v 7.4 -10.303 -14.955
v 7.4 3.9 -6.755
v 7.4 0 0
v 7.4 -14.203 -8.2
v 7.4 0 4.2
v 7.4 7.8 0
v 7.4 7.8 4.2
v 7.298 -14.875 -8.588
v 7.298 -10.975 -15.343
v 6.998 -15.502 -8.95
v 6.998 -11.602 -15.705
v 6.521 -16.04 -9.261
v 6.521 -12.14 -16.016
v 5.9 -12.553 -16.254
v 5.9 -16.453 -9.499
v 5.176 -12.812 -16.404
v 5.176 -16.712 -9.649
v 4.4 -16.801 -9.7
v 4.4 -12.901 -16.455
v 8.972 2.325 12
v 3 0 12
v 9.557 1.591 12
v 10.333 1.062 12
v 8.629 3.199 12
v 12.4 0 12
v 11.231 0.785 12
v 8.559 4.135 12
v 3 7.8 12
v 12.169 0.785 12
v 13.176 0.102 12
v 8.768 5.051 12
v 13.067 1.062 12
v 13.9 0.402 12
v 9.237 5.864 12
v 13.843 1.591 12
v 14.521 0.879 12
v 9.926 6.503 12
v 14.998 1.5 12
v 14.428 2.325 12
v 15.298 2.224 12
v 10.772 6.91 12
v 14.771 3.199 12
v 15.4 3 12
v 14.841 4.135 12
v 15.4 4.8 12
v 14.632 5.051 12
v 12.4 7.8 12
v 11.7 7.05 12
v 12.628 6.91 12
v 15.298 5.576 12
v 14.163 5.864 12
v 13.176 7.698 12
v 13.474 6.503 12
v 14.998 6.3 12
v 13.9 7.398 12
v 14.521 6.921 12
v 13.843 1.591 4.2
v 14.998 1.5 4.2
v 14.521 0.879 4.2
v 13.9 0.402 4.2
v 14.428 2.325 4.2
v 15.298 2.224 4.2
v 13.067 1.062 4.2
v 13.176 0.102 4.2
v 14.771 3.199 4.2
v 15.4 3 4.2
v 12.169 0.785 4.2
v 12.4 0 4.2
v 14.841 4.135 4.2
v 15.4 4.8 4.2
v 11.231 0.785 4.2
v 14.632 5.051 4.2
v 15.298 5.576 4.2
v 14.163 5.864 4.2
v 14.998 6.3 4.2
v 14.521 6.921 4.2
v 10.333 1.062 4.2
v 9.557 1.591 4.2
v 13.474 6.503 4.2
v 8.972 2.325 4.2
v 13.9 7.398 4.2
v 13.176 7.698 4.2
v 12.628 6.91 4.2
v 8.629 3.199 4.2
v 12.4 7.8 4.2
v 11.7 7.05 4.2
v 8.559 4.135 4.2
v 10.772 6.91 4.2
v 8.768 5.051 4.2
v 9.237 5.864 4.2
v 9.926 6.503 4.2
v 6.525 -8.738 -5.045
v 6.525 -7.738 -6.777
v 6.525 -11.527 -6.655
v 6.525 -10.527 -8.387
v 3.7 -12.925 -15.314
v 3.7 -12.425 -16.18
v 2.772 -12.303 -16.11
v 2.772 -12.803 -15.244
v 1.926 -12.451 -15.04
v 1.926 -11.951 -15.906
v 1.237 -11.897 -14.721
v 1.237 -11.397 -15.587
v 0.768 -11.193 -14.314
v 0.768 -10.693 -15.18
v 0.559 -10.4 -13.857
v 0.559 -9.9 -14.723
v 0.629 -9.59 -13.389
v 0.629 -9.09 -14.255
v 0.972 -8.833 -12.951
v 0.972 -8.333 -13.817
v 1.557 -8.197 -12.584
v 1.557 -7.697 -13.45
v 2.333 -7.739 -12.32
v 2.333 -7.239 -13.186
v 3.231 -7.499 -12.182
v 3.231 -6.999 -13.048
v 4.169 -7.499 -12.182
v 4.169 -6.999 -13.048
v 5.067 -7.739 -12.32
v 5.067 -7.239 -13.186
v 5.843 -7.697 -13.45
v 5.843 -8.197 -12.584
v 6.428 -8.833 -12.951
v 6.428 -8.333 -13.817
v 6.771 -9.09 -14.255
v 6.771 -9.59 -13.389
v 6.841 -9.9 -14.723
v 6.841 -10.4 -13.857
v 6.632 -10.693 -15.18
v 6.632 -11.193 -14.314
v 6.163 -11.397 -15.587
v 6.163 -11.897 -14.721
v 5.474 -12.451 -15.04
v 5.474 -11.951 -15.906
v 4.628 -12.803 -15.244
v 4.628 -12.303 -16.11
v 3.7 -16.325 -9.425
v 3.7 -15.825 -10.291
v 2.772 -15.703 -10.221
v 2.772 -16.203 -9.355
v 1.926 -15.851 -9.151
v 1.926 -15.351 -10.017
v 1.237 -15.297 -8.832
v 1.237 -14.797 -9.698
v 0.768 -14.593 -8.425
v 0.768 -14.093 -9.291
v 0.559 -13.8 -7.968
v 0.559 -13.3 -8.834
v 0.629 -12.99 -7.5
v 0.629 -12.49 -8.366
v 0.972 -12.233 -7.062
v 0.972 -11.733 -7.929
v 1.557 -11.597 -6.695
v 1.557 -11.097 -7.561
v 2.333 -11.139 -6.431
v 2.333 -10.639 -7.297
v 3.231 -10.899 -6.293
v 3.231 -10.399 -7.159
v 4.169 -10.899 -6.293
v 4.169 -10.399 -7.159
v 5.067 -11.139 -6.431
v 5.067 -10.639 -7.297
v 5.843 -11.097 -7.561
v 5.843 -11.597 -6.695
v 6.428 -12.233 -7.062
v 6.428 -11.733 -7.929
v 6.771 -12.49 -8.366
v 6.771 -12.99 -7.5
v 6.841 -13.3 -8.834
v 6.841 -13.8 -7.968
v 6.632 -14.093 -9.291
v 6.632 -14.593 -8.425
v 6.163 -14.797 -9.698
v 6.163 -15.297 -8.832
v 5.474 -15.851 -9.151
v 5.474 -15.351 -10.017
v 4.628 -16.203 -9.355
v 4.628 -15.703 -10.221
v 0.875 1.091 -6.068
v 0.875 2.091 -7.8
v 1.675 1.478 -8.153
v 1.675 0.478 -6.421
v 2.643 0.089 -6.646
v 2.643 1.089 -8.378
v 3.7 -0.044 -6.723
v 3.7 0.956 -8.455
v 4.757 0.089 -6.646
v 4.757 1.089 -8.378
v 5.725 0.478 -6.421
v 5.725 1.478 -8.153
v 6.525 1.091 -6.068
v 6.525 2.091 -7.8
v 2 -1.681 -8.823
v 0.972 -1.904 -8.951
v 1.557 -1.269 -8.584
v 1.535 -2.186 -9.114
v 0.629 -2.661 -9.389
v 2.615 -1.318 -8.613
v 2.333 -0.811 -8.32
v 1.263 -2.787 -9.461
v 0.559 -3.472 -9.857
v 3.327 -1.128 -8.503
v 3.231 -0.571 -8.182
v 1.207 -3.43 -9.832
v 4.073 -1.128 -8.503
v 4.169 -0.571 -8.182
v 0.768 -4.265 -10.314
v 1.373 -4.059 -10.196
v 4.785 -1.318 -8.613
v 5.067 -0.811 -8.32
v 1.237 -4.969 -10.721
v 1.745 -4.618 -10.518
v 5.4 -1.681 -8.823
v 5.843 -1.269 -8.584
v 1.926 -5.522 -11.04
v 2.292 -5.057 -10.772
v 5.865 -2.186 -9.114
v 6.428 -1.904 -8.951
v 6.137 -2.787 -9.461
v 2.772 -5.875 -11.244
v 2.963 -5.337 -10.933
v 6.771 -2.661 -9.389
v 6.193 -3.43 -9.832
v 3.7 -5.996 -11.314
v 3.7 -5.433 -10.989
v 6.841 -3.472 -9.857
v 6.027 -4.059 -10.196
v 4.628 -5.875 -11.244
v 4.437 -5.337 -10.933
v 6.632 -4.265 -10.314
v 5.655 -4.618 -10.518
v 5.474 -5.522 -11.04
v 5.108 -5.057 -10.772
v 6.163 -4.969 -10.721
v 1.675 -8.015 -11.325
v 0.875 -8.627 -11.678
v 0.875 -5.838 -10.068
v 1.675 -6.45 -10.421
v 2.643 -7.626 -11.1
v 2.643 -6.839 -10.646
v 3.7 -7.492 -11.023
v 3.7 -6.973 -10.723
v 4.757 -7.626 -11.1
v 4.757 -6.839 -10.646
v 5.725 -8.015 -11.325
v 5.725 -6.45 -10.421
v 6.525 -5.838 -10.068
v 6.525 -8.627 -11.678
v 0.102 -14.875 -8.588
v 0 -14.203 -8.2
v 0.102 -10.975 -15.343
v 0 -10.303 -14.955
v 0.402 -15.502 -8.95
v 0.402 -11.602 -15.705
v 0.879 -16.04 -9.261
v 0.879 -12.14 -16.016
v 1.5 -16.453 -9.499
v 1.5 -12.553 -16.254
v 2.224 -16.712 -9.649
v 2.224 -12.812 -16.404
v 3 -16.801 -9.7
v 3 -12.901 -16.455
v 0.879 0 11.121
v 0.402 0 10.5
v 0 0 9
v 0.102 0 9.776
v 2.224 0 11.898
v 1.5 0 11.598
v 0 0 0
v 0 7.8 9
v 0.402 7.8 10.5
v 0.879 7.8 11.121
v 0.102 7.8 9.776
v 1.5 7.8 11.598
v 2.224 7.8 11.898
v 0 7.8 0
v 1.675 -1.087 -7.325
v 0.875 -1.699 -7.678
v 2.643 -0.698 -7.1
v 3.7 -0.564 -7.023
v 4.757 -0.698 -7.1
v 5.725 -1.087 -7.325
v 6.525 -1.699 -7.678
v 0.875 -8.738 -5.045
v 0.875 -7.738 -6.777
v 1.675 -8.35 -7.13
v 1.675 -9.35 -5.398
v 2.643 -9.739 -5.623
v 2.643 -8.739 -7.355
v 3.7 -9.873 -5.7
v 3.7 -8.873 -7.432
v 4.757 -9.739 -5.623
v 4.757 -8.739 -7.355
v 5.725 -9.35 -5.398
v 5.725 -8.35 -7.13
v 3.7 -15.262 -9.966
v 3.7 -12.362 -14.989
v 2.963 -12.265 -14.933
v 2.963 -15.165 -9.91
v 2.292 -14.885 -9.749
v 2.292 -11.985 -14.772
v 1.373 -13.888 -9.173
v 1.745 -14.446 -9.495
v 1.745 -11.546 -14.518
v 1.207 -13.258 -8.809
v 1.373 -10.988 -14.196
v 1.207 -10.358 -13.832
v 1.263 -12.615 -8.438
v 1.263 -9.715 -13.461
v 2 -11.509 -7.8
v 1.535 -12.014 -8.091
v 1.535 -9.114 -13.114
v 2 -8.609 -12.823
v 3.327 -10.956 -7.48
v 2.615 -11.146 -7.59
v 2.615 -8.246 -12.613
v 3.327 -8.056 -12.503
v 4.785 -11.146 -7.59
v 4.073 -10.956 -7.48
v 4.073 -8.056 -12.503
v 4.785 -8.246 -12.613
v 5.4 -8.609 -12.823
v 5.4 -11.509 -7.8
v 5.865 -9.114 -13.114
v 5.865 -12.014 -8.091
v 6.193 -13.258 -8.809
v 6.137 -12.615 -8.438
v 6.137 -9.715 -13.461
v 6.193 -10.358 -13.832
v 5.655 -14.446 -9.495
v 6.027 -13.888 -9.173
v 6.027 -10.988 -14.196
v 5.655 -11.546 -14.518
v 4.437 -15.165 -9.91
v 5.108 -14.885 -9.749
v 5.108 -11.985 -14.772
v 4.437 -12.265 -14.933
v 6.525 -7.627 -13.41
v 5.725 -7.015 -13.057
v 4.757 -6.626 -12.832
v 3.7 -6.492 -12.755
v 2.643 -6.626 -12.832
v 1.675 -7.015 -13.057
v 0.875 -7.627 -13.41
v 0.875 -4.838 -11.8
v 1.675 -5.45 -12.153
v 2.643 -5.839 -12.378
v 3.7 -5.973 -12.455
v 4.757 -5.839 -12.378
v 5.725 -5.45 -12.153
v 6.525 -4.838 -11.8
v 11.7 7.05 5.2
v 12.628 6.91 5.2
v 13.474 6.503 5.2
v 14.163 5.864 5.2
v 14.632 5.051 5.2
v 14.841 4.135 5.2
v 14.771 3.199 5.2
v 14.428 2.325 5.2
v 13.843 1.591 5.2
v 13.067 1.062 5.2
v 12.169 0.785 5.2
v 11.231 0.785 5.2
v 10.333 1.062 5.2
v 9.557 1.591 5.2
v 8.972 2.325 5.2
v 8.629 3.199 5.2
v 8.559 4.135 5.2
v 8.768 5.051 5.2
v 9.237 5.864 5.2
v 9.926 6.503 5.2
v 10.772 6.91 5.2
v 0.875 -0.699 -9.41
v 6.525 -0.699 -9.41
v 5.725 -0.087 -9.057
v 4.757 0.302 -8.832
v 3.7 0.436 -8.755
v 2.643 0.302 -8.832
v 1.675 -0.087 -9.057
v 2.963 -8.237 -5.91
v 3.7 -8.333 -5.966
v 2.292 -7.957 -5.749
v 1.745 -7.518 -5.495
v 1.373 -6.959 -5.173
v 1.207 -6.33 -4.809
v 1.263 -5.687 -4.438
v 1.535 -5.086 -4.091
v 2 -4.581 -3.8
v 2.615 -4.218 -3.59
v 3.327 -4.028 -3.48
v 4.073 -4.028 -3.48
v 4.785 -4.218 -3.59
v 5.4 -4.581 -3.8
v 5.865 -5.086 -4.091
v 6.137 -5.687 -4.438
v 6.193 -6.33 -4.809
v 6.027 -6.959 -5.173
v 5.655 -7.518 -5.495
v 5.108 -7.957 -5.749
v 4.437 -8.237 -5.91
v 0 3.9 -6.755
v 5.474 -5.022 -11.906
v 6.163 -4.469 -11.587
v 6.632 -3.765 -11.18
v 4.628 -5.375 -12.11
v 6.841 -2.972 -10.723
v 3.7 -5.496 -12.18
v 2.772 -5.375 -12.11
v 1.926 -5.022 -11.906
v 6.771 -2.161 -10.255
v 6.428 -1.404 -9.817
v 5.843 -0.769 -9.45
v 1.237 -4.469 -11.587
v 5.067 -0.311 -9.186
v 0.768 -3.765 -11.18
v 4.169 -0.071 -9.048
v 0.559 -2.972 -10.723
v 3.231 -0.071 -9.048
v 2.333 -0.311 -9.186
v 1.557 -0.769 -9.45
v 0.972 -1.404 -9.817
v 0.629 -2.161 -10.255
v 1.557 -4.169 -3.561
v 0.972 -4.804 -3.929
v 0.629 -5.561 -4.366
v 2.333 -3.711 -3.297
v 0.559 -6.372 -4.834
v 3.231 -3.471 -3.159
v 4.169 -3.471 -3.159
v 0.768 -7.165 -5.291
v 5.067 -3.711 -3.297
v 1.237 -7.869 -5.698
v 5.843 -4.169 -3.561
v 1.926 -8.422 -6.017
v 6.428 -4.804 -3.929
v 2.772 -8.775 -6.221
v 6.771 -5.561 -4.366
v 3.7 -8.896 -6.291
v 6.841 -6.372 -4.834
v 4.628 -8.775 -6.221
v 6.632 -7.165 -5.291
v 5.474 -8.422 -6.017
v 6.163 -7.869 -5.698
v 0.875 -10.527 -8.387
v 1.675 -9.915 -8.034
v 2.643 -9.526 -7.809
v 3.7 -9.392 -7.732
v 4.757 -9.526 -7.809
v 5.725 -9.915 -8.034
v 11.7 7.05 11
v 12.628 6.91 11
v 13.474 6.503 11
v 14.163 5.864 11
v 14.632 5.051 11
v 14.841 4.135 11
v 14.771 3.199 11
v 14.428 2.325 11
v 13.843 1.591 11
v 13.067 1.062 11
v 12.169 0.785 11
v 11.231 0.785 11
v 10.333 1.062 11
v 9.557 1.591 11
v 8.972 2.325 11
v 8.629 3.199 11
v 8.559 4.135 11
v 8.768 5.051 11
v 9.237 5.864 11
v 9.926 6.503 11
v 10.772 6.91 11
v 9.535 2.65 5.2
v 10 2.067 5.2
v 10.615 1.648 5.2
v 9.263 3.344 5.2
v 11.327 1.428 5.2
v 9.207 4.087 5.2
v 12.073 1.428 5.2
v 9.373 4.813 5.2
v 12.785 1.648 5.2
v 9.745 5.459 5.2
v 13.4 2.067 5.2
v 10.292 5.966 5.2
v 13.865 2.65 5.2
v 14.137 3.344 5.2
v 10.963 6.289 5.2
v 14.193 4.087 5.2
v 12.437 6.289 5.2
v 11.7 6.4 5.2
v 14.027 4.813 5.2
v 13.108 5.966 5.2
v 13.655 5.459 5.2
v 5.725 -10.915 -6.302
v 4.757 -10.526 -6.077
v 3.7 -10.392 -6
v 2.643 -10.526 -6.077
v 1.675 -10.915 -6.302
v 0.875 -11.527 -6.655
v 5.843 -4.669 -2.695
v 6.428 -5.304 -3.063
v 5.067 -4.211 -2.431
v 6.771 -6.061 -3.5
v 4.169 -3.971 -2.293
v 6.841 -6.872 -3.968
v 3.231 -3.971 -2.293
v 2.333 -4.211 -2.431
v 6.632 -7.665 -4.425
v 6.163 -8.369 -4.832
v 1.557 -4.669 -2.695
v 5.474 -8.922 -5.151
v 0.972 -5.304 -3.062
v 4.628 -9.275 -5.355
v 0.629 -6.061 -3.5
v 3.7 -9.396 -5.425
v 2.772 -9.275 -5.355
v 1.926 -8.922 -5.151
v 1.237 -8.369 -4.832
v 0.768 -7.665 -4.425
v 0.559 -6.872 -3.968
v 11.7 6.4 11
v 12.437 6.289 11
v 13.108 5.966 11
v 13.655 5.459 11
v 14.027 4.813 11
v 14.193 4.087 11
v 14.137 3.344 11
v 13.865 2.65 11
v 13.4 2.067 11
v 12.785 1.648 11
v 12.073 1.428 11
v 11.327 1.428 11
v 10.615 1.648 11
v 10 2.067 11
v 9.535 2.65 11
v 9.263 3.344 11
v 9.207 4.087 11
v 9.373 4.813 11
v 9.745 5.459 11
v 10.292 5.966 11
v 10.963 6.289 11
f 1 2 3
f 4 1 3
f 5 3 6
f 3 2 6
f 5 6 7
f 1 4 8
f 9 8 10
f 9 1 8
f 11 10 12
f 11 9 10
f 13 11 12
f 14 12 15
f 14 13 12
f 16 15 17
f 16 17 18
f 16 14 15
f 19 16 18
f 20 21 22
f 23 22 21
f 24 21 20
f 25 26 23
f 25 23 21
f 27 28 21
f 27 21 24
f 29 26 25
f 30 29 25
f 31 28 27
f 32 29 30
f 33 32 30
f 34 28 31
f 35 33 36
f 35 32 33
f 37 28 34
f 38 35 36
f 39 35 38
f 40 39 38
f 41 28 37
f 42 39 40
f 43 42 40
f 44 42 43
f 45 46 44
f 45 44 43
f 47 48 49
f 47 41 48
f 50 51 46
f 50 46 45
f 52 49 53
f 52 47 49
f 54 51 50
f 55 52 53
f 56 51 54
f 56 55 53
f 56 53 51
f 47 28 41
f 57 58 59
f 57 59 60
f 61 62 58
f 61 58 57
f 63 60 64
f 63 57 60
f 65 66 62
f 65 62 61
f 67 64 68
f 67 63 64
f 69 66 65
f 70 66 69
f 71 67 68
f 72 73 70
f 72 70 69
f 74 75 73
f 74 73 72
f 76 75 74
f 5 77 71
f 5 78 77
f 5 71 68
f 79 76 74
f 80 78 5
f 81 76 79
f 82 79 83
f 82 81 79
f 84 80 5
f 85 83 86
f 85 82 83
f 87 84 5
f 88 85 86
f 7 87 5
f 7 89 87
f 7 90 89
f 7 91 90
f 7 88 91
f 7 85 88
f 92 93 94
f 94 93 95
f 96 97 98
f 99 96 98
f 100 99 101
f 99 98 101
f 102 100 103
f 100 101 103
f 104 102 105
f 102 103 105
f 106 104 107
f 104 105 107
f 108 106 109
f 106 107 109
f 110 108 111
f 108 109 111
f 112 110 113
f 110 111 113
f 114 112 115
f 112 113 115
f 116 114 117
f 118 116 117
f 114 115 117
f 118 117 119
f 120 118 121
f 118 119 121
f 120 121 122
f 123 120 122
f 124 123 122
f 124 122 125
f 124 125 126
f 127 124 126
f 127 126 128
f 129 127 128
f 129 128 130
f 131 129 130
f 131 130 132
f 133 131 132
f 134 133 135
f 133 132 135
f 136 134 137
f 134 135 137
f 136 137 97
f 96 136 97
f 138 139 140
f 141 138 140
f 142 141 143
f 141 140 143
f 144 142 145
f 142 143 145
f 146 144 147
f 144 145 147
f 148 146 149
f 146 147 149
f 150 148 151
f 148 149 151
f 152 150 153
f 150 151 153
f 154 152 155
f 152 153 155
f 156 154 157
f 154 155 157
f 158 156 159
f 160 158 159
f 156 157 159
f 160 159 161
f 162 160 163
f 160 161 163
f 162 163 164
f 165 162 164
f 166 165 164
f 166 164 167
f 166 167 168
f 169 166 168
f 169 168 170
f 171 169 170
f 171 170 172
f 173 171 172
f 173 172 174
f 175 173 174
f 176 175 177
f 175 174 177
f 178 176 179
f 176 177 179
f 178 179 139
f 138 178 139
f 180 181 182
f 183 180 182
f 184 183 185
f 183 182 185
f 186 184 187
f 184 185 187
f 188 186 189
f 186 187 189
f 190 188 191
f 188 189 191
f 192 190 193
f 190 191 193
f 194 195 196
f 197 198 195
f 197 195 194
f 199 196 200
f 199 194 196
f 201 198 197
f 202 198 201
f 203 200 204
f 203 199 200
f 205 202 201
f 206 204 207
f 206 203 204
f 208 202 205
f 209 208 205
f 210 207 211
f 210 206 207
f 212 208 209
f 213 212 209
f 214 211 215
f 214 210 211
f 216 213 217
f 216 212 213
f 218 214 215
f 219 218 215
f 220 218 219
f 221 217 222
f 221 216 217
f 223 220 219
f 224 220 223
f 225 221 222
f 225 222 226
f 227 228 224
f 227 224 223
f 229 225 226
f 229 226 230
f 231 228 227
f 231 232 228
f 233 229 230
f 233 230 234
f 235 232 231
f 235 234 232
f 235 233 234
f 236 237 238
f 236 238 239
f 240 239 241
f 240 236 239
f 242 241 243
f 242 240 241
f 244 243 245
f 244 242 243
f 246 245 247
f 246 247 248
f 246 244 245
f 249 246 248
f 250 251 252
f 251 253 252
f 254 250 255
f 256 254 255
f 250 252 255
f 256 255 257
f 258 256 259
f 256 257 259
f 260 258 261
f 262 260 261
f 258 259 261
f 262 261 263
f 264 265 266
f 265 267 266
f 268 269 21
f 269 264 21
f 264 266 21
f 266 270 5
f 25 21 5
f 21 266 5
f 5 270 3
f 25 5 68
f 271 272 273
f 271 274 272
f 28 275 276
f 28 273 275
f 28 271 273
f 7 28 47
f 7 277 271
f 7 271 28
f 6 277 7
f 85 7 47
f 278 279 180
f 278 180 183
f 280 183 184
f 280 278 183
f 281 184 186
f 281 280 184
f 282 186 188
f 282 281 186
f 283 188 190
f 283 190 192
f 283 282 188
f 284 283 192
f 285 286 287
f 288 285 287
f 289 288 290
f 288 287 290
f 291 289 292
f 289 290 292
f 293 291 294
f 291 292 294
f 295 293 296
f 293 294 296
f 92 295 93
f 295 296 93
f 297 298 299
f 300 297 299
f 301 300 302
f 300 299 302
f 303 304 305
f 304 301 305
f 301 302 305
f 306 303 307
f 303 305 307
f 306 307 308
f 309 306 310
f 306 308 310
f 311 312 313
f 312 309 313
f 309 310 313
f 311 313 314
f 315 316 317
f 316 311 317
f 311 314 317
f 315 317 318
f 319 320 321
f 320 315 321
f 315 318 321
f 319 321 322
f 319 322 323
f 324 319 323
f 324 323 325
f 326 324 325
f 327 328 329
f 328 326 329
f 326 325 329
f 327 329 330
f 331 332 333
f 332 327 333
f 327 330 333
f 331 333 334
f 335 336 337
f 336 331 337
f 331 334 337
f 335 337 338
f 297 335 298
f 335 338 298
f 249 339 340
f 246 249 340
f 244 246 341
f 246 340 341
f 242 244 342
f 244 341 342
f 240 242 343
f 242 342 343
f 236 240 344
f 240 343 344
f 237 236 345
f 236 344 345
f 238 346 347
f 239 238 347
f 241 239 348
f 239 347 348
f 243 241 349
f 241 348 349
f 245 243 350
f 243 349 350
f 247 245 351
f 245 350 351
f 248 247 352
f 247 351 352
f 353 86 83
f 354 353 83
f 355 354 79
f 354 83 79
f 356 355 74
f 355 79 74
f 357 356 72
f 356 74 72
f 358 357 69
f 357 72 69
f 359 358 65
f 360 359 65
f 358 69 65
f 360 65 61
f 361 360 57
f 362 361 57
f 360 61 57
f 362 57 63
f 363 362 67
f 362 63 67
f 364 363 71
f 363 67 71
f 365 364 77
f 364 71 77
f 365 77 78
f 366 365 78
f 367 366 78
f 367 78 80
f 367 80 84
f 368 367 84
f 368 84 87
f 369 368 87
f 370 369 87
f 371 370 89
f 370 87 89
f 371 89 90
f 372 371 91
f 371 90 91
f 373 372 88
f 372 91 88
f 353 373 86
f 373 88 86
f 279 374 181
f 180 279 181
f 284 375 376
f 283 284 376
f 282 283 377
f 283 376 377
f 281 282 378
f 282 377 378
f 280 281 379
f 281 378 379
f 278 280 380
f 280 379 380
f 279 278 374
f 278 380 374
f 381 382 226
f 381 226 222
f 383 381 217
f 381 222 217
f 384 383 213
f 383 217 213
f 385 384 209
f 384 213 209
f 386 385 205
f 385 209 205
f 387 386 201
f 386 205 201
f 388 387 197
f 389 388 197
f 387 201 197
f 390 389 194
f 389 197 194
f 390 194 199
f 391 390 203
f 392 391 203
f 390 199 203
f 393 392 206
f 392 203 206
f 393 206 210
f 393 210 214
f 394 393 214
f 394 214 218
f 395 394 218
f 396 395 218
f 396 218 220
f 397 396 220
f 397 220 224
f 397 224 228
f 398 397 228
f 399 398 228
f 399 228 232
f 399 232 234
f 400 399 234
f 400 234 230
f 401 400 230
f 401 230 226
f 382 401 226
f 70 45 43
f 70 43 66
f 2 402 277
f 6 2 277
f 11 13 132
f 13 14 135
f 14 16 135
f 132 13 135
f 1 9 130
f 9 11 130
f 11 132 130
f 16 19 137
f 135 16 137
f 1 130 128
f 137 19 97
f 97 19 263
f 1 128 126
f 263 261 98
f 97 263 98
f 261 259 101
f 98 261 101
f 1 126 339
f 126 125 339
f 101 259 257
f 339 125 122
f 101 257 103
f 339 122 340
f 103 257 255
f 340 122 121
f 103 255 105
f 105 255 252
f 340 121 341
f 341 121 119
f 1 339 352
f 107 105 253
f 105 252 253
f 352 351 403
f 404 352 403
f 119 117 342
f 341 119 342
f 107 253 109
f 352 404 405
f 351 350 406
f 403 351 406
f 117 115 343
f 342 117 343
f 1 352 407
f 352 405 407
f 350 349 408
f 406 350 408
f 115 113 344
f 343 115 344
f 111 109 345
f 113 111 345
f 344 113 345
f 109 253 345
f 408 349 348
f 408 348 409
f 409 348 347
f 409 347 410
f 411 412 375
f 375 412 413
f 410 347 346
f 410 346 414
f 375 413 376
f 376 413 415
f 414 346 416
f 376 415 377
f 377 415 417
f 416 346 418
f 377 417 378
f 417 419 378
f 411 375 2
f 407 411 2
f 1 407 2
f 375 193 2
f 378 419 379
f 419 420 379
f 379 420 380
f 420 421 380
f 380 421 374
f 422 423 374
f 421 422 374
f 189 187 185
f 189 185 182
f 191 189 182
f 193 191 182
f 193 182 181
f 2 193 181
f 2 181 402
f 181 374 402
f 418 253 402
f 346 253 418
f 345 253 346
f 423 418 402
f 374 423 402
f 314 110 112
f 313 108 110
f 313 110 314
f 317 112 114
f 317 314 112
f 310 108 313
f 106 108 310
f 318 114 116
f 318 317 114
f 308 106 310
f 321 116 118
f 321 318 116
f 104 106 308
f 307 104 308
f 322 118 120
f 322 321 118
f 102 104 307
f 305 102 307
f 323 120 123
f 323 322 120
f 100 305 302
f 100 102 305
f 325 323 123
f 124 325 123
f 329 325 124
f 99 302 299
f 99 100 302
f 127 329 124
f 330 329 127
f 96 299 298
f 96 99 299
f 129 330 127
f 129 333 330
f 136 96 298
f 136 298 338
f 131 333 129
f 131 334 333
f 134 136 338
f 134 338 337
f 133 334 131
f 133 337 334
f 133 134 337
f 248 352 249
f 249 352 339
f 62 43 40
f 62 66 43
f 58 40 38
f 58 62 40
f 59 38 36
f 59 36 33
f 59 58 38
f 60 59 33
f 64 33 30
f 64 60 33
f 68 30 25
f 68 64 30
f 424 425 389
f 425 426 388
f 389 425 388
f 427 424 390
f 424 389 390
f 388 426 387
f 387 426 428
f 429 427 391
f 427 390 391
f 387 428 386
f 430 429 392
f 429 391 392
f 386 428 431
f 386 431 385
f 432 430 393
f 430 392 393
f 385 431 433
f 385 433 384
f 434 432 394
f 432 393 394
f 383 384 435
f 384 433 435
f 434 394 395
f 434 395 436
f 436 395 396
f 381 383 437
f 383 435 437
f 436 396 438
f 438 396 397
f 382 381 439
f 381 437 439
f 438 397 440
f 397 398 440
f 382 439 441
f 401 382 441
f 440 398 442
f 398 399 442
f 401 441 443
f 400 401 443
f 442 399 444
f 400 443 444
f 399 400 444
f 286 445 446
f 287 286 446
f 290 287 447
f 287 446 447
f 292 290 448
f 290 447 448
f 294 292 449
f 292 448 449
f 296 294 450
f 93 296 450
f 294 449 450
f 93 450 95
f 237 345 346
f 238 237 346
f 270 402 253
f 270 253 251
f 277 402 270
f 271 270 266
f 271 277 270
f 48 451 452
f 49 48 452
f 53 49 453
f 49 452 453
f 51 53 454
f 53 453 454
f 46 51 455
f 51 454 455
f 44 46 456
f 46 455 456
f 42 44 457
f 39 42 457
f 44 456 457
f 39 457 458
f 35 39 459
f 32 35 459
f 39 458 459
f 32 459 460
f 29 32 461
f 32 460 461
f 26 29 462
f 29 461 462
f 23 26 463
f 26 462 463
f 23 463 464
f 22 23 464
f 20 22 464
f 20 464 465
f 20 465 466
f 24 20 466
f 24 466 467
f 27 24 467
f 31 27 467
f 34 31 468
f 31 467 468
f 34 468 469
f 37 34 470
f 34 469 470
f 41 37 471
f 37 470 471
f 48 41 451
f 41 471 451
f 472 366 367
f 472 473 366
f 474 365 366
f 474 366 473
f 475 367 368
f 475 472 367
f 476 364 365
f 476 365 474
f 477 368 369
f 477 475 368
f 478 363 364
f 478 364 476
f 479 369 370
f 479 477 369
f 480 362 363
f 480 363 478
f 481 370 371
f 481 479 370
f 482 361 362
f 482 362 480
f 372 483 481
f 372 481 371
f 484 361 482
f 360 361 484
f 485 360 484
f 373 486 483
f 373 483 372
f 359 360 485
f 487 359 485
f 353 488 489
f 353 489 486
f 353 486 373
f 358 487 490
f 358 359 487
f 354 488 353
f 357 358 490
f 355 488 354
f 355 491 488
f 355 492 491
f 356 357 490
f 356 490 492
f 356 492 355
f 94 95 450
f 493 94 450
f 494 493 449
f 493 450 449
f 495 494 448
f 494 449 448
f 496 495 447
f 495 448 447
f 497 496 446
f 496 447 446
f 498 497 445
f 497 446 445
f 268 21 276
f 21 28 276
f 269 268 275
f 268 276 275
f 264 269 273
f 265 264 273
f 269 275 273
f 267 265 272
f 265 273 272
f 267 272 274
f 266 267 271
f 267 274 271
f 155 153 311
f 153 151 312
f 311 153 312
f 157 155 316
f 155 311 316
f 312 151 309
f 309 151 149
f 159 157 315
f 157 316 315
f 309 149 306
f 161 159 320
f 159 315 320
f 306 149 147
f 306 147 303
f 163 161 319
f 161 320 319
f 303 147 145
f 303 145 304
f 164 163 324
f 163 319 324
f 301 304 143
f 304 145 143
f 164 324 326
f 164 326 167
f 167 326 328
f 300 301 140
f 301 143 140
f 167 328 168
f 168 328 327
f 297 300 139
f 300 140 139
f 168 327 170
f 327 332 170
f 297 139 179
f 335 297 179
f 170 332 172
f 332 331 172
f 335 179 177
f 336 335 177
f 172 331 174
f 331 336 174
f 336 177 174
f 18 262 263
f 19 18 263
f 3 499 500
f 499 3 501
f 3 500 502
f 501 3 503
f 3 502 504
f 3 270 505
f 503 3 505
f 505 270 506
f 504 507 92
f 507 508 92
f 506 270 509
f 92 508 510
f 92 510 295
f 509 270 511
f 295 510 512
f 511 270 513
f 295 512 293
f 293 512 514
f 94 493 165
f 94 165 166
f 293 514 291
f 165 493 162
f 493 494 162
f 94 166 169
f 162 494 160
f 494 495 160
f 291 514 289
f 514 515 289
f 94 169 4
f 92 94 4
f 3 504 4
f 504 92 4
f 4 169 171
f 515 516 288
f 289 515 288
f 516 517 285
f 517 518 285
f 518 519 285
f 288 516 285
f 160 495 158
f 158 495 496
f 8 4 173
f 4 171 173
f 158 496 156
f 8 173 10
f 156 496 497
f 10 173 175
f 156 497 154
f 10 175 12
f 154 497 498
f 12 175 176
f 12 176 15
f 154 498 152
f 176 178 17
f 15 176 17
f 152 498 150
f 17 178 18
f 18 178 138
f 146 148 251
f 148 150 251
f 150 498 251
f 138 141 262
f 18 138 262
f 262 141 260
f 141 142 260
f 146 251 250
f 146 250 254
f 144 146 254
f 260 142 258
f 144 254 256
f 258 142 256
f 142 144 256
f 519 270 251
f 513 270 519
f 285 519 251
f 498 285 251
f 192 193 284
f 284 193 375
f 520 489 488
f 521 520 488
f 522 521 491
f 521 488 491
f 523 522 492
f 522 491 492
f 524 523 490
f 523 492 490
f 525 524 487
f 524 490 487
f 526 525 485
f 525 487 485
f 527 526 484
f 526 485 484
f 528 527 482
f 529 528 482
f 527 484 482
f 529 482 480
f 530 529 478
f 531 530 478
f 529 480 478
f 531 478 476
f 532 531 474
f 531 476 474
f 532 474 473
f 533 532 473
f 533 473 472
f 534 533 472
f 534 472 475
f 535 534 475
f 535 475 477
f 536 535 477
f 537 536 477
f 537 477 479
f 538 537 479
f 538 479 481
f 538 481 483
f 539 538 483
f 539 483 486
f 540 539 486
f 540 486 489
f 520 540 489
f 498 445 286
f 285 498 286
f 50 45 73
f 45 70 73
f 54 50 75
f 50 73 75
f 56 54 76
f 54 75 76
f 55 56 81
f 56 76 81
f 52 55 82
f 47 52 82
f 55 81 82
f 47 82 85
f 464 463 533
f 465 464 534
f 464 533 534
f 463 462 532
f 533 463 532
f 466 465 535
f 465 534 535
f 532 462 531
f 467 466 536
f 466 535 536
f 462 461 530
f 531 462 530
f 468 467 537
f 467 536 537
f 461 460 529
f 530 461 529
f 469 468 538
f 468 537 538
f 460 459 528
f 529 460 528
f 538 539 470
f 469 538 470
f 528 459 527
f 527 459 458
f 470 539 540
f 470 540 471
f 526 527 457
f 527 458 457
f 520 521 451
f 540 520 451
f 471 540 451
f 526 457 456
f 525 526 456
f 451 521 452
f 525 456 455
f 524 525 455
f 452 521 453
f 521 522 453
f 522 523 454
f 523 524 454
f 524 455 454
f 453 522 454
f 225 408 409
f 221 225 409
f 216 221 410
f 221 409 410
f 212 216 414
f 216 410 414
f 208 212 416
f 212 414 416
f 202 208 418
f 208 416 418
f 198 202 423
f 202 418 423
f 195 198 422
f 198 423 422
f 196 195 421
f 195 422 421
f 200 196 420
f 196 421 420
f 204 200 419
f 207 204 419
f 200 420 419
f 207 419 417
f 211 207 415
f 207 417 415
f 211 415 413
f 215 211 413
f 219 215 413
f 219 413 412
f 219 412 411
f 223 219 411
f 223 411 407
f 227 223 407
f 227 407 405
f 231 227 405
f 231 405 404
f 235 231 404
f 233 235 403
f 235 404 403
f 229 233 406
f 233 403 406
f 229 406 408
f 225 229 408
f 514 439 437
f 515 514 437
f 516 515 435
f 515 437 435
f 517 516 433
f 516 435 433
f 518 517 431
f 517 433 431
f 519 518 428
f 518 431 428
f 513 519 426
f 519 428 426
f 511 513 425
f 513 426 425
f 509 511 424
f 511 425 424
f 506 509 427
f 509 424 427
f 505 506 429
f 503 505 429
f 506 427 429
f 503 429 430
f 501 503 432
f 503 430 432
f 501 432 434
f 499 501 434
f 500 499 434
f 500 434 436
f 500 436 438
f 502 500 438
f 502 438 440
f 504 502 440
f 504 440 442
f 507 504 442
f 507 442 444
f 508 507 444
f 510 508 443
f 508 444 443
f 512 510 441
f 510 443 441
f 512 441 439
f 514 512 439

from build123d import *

# Parameters (mm, degrees)
EXTRUDE_1_DEPTH        = 7.4
EXTRUDE_2_DEPTH        = 7.8
CUT_EXTRUDE_1_REACH    = 32.758
SKETCH_4_R             = 2.5000000000000004
SKETCH_4_3_R           = 3.1499999999999972
CUT_EXTRUDE_2_DEPTH    = 1
CUT_EXTRUDE_START      = -6.8
SKETCH_4_4_R           = 3.1499999999999972
CUT_EXTRUDE_3_DEPTH    = 1
CUT_EXTRUDE_4_DEPTH    = 1
CUT_EXTRUDE_5_DEPTH    = 1
CUT_EXTRUDE_6_REACH    = 33.897
PATTERN_LINEAR_1_COUNT = 2
PATTERN_LINEAR_1_PITCH = 8
CUT_EXTRUDE_7_DEPTH    = 2
CUT_EXTRUDE_START_2    = -5.8
CUT_EXTRUDE_8_DEPTH    = 2
FILLET_1_R             = 3
PATTERN_LINEAR_3_COUNT = 2
PATTERN_LINEAR_3_PITCH = 8


with BuildPart() as part:
    # 草图1 → 凸台-拉伸1 (new body)
    with BuildSketch(Plane(origin=(0, 0, 0), x_dir=(0, 0, -1), z_dir=(1, 0, 0))):
        Polygon((-6.94e-15, 7.800000000000002), (0, 0), (-12, 0), (-12.000000000000002, 7.8), align=None)
        Polygon((-6.94e-15, 7.800000000000002), (0, 0), (6.754998149518629, 3.8999999999999866), align=None)
        Polygon((0, 0), (9.699999999999958, -16.800892833418125), (16.45499814951859, -12.90089283341814), (6.754998149518629, 3.8999999999999866), align=None)
    extrude(amount=EXTRUDE_1_DEPTH)

    # 草图2 → 凸台-拉伸2 (add)
    with BuildSketch(Plane(origin=(0, 7.800000000000002, 1.13e-15), x_dir=(1, 0, 0), z_dir=(0, 1, 2.3e-16))):
        Polygon((7.400000000000001, -12), (15.4, -11.999999999999998), (15.399999999999997, -4.199999999999999), (7.4, -4.2), align=None)
    extrude(amount=-EXTRUDE_2_DEPTH)

    # 草图4 → 切除-拉伸1 (cut, up to next)
    with BuildSketch(Plane(origin=(0, -9.5e-16, 4.199999999999999), x_dir=(-1, 0, 0), z_dir=(0, 2.3e-16, -1)), mode=Mode.PRIVATE) as cut_extrude_1_sk1:
        with Locations(Location((-11.70000000000001, 3.9000000000000017, 0), (0, 0, 90))):
            Circle(SKETCH_4_R)
    cut_extrude_1_tool1 = extrude(cut_extrude_1_sk1.sketch, amount=-CUT_EXTRUDE_1_REACH, mode=Mode.PRIVATE) & part.part
    add(cut_extrude_1_tool1.solids().sort_by_distance((11.7, 3.9, 4.2))[0], mode=Mode.SUBTRACT)

    # 草图4<3> → 切除-拉伸2 (cut)
    with BuildSketch(Plane(origin=(0, -9.5e-16, 4.199999999999999), x_dir=(-1, 0, 0), z_dir=(0, 2.3e-16, -1))):
        with Locations(Location((-11.70000000000001, 3.9000000000000017, 0), (0, 0, 90))):
            Circle(SKETCH_4_3_R)
    extrude(amount=-CUT_EXTRUDE_2_DEPTH, mode=Mode.SUBTRACT)

    # 草图4<4> → 切除-拉伸3 (cut)
    with BuildSketch(Plane(origin=(0, -9.5e-16, 4.199999999999999), x_dir=(-1, 0, 0), z_dir=(0, 2.3e-16, -1)).offset(CUT_EXTRUDE_START)):
        with Locations(Location((-11.70000000000001, 3.9000000000000017, 0), (0, 0, 90))):
            Circle(SKETCH_4_4_R)
    extrude(amount=-CUT_EXTRUDE_3_DEPTH, mode=Mode.SUBTRACT)

    # 草图5 → 切除-拉伸4 (cut)
    with BuildSketch(Plane(origin=(0, 3.8999999999999857, -6.754998149518631), x_dir=(1, 0, 0), z_dir=(0, 0.499999999999998, -0.8660254037844397))):
        with BuildLine():
            ThreePointArc((6.85, 15.699999999999992), (5.927386360737607, 17.927386360737636), (3.6999999999999518, 18.84999999999999))
            Line((3.7000000000000024, 18.84999999999999), (3.7000000000000024, 18.199999999999992))
            ThreePointArc((3.6999999999999913, 18.199999999999992), (5.4677669529663655, 17.467766952966365), (6.199999999999999, 15.699999999999992))
            ThreePointArc((6.199999999999999, 15.699999999999992), (5.467766952966364, 13.93223304703362), (3.699999999999989, 13.199999999999992))
            Line((3.7000000000000024, 13.199999999999992), (3.7000000000000024, 12.549999999999994))
            ThreePointArc((3.6999999999999496, 12.549999999999994), (5.927386360737607, 13.472613639262349), (6.85, 15.699999999999992))
        make_face()
        with BuildLine():
            Line((3.7000000000000024, 18.199999999999992), (3.7000000000000024, 18.84999999999999))
            ThreePointArc((3.6999999999999513, 18.84999999999999), (0.5500000000000012, 15.699999999999992), (3.6999999999999496, 12.549999999999994))
            Line((3.7000000000000024, 12.549999999999994), (3.7000000000000024, 13.199999999999992))
            ThreePointArc((3.699999999999989, 13.199999999999992), (1.2000000000000015, 15.699999999999992), (3.6999999999999913, 18.199999999999992))
        make_face()
    cut_extrude_4 = extrude(amount=-CUT_EXTRUDE_4_DEPTH, mode=Mode.SUBTRACT)

    # 草图5<3> → 切除-拉伸5 (cut)
    with BuildSketch(Plane(origin=(0, 3.8999999999999857, -6.754998149518631), x_dir=(1, 0, 0), z_dir=(0, 0.499999999999998, -0.8660254037844397)).offset(CUT_EXTRUDE_START)):
        with BuildLine():
            ThreePointArc((6.85, 15.699999999999992), (5.927386360737607, 17.927386360737636), (3.6999999999999518, 18.84999999999999))
            Line((3.7000000000000024, 18.84999999999999), (3.7000000000000024, 18.199999999999992))
            ThreePointArc((3.6999999999999913, 18.199999999999992), (5.4677669529663655, 17.467766952966365), (6.199999999999999, 15.699999999999992))
            ThreePointArc((6.199999999999999, 15.699999999999992), (5.467766952966364, 13.93223304703362), (3.699999999999989, 13.199999999999992))
            Line((3.7000000000000024, 13.199999999999992), (3.7000000000000024, 12.549999999999994))
            ThreePointArc((3.6999999999999496, 12.549999999999994), (5.927386360737607, 13.472613639262349), (6.85, 15.699999999999992))
        make_face()
        with BuildLine():
            Line((3.7000000000000024, 18.199999999999992), (3.7000000000000024, 18.84999999999999))
            ThreePointArc((3.6999999999999513, 18.84999999999999), (0.5500000000000012, 15.699999999999992), (3.6999999999999496, 12.549999999999994))
            Line((3.7000000000000024, 12.549999999999994), (3.7000000000000024, 13.199999999999992))
            ThreePointArc((3.699999999999989, 13.199999999999992), (1.2000000000000015, 15.699999999999992), (3.6999999999999913, 18.199999999999992))
        make_face()
    cut_extrude_5 = extrude(amount=-CUT_EXTRUDE_5_DEPTH, mode=Mode.SUBTRACT)

    # 草图5<4> → 切除-拉伸6 (cut, up to next)
    with BuildSketch(Plane(origin=(0, 3.8999999999999857, -6.754998149518631), x_dir=(1, 0, 0), z_dir=(0, 0.499999999999998, -0.8660254037844397)), mode=Mode.PRIVATE) as cut_extrude_6_sk1:
        with BuildLine():
            ThreePointArc((6.199999999999999, 15.699999999999992), (5.4677669529663655, 17.467766952966365), (3.6999999999999913, 18.199999999999992))
            Line((3.7000000000000024, 18.199999999999992), (3.7000000000000024, 13.199999999999992))
            ThreePointArc((3.699999999999989, 13.199999999999992), (5.467766952966364, 13.93223304703362), (6.199999999999999, 15.699999999999992))
        make_face()
    cut_extrude_6_tool1 = extrude(cut_extrude_6_sk1.sketch, amount=-CUT_EXTRUDE_6_REACH, mode=Mode.PRIVATE) & part.part
    # 草图5<4> → 切除-拉伸6 (cut, up to next)
    with BuildSketch(Plane(origin=(0, 3.8999999999999857, -6.754998149518631), x_dir=(1, 0, 0), z_dir=(0, 0.499999999999998, -0.8660254037844397)), mode=Mode.PRIVATE) as cut_extrude_6_sk2:
        with BuildLine():
            Line((3.7000000000000024, 13.199999999999992), (3.7000000000000024, 18.199999999999992))
            ThreePointArc((3.6999999999999913, 18.199999999999992), (1.2000000000000015, 15.699999999999992), (3.699999999999989, 13.199999999999992))
        make_face()
    cut_extrude_6_tool2 = extrude(cut_extrude_6_sk2.sketch, amount=-CUT_EXTRUDE_6_REACH, mode=Mode.PRIVATE) & part.part
    # 草图5<4> → 切除-拉伸6 (cut, up to next)
    with BuildSketch(Plane(origin=(0, 3.8999999999999857, -6.754998149518631), x_dir=(1, 0, 0), z_dir=(0, 0.499999999999998, -0.8660254037844397)), mode=Mode.PRIVATE) as cut_extrude_6_sk3:
        with BuildLine():
            ThreePointArc((6.199999999999999, 15.699999999999992), (5.4677669529663655, 17.467766952966365), (3.6999999999999913, 18.199999999999992))
            Line((3.7000000000000024, 18.199999999999992), (3.7000000000000024, 13.199999999999992))
            ThreePointArc((3.699999999999989, 13.199999999999992), (5.467766952966364, 13.93223304703362), (6.199999999999999, 15.699999999999992))
        make_face()
    cut_extrude_6_tool3 = extrude(cut_extrude_6_sk3.sketch, amount=-CUT_EXTRUDE_6_REACH, mode=Mode.PRIVATE) & part.part
    # 草图5<4> → 切除-拉伸6 (cut, up to next)
    with BuildSketch(Plane(origin=(0, 3.8999999999999857, -6.754998149518631), x_dir=(1, 0, 0), z_dir=(0, 0.499999999999998, -0.8660254037844397)), mode=Mode.PRIVATE) as cut_extrude_6_sk4:
        with BuildLine():
            Line((3.7000000000000024, 13.199999999999992), (3.7000000000000024, 18.199999999999992))
            ThreePointArc((3.6999999999999913, 18.199999999999992), (1.2000000000000015, 15.699999999999992), (3.699999999999989, 13.199999999999992))
        make_face()
    cut_extrude_6_tool4 = extrude(cut_extrude_6_sk4.sketch, amount=-CUT_EXTRUDE_6_REACH, mode=Mode.PRIVATE) & part.part
    cut_extrude_6_1 = cut_extrude_6_tool1.solids().sort_by_distance((4.761033, -9.696599, -14.604998))[0]
    add(cut_extrude_6_1, mode=Mode.SUBTRACT)
    cut_extrude_6_2 = cut_extrude_6_tool2.solids().sort_by_distance((2.638967, -9.696599, -14.604998))[0]
    add(cut_extrude_6_2, mode=Mode.SUBTRACT)
    cut_extrude_6_3 = cut_extrude_6_tool3.solids().sort_by_distance((4.761033, -9.696599, -14.604998))[0]
    add(cut_extrude_6_3, mode=Mode.SUBTRACT)
    cut_extrude_6_4 = cut_extrude_6_tool4.solids().sort_by_distance((2.638967, -9.696599, -14.604998))[0]
    add(cut_extrude_6_4, mode=Mode.SUBTRACT)
    cut_extrude_6 = cut_extrude_6_1 + cut_extrude_6_2 + cut_extrude_6_3 + cut_extrude_6_4  # 切除-拉伸6 as one shape, for the pattern or mirror that repeats it

    # 阵列(线性)1: 切除-拉伸4, 切除-拉伸5, 切除-拉伸6 ×2
    with Locations(*[Vector(0, 0.8660254037844397, 0.49999999999999806) * (i * PATTERN_LINEAR_1_PITCH) for i in range(1, PATTERN_LINEAR_1_COUNT)]):
        add(cut_extrude_4, mode=Mode.SUBTRACT)
        add(cut_extrude_5, mode=Mode.SUBTRACT)
        add(cut_extrude_6, mode=Mode.SUBTRACT)

    # 草图6 → 切除-拉伸7 (cut)
    with BuildSketch(Plane(origin=(0, 3.899999999999984, -6.754998149518628), x_dir=(1, 0, 0), z_dir=(0, 0.49999999999999806, -0.8660254037844398))):
        with BuildLine():
            Line((6.525000000000001, 10.089429848311095), (6.525, 13.31057015168897))
            ThreePointArc((6.52500000000005, 13.310570151688953), (3.699999999999908, 11.999999999999995), (0.8749999999998344, 13.310570151689092))
            Line((0.8750000000000009, 13.310570151689145), (0.8750000000000012, 10.089429848311095))
            ThreePointArc((0.8750000000000027, 10.089429848311095), (3.7000000000000015, 11.399999999999995), (6.525, 10.089429848311095))
        make_face()
    cut_extrude_7 = extrude(amount=-CUT_EXTRUDE_7_DEPTH, mode=Mode.SUBTRACT)

    # 草图6<3> → 切除-拉伸8 (cut)
    with BuildSketch(Plane(origin=(0, 3.899999999999984, -6.754998149518628), x_dir=(1, 0, 0), z_dir=(0, 0.49999999999999806, -0.8660254037844398)).offset(CUT_EXTRUDE_START_2)):
        with BuildLine():
            Line((6.525000000000001, 10.089429848311095), (6.525, 13.31057015168897))
            ThreePointArc((6.52500000000005, 13.310570151688953), (3.699999999999908, 11.999999999999995), (0.8749999999998344, 13.310570151689092))
            Line((0.8750000000000009, 13.310570151689145), (0.8750000000000012, 10.089429848311095))
            ThreePointArc((0.8750000000000027, 10.089429848311095), (3.7000000000000015, 11.399999999999995), (6.525, 10.089429848311095))
        make_face()
    extrude(amount=-CUT_EXTRUDE_8_DEPTH, mode=Mode.SUBTRACT)

    # 圆角1
    fillet_1_edges = [part.edges().sort_by_distance(p)[0] for p in [
        (0, -14.850892833418133, -13.077499074759274),
        (7.4, -14.850892833418133, -13.077499074759274),
        (15.399999999999999, 7.8, 8.1),
        (15.399999999999999, -5e-17, 8.099999999999998),
        (0, 3.9, 12),
    ]]
    fillet(fillet_1_edges, radius=FILLET_1_R)

    # 阵列(线性)3: 切除-拉伸7 ×2
    with Locations(*[Vector(0, 0.86602540378444, 0.4999999999999977) * (i * PATTERN_LINEAR_3_PITCH) for i in range(1, PATTERN_LINEAR_3_COUNT)]):
        add(cut_extrude_7, mode=Mode.SUBTRACT)


solid = part.part
